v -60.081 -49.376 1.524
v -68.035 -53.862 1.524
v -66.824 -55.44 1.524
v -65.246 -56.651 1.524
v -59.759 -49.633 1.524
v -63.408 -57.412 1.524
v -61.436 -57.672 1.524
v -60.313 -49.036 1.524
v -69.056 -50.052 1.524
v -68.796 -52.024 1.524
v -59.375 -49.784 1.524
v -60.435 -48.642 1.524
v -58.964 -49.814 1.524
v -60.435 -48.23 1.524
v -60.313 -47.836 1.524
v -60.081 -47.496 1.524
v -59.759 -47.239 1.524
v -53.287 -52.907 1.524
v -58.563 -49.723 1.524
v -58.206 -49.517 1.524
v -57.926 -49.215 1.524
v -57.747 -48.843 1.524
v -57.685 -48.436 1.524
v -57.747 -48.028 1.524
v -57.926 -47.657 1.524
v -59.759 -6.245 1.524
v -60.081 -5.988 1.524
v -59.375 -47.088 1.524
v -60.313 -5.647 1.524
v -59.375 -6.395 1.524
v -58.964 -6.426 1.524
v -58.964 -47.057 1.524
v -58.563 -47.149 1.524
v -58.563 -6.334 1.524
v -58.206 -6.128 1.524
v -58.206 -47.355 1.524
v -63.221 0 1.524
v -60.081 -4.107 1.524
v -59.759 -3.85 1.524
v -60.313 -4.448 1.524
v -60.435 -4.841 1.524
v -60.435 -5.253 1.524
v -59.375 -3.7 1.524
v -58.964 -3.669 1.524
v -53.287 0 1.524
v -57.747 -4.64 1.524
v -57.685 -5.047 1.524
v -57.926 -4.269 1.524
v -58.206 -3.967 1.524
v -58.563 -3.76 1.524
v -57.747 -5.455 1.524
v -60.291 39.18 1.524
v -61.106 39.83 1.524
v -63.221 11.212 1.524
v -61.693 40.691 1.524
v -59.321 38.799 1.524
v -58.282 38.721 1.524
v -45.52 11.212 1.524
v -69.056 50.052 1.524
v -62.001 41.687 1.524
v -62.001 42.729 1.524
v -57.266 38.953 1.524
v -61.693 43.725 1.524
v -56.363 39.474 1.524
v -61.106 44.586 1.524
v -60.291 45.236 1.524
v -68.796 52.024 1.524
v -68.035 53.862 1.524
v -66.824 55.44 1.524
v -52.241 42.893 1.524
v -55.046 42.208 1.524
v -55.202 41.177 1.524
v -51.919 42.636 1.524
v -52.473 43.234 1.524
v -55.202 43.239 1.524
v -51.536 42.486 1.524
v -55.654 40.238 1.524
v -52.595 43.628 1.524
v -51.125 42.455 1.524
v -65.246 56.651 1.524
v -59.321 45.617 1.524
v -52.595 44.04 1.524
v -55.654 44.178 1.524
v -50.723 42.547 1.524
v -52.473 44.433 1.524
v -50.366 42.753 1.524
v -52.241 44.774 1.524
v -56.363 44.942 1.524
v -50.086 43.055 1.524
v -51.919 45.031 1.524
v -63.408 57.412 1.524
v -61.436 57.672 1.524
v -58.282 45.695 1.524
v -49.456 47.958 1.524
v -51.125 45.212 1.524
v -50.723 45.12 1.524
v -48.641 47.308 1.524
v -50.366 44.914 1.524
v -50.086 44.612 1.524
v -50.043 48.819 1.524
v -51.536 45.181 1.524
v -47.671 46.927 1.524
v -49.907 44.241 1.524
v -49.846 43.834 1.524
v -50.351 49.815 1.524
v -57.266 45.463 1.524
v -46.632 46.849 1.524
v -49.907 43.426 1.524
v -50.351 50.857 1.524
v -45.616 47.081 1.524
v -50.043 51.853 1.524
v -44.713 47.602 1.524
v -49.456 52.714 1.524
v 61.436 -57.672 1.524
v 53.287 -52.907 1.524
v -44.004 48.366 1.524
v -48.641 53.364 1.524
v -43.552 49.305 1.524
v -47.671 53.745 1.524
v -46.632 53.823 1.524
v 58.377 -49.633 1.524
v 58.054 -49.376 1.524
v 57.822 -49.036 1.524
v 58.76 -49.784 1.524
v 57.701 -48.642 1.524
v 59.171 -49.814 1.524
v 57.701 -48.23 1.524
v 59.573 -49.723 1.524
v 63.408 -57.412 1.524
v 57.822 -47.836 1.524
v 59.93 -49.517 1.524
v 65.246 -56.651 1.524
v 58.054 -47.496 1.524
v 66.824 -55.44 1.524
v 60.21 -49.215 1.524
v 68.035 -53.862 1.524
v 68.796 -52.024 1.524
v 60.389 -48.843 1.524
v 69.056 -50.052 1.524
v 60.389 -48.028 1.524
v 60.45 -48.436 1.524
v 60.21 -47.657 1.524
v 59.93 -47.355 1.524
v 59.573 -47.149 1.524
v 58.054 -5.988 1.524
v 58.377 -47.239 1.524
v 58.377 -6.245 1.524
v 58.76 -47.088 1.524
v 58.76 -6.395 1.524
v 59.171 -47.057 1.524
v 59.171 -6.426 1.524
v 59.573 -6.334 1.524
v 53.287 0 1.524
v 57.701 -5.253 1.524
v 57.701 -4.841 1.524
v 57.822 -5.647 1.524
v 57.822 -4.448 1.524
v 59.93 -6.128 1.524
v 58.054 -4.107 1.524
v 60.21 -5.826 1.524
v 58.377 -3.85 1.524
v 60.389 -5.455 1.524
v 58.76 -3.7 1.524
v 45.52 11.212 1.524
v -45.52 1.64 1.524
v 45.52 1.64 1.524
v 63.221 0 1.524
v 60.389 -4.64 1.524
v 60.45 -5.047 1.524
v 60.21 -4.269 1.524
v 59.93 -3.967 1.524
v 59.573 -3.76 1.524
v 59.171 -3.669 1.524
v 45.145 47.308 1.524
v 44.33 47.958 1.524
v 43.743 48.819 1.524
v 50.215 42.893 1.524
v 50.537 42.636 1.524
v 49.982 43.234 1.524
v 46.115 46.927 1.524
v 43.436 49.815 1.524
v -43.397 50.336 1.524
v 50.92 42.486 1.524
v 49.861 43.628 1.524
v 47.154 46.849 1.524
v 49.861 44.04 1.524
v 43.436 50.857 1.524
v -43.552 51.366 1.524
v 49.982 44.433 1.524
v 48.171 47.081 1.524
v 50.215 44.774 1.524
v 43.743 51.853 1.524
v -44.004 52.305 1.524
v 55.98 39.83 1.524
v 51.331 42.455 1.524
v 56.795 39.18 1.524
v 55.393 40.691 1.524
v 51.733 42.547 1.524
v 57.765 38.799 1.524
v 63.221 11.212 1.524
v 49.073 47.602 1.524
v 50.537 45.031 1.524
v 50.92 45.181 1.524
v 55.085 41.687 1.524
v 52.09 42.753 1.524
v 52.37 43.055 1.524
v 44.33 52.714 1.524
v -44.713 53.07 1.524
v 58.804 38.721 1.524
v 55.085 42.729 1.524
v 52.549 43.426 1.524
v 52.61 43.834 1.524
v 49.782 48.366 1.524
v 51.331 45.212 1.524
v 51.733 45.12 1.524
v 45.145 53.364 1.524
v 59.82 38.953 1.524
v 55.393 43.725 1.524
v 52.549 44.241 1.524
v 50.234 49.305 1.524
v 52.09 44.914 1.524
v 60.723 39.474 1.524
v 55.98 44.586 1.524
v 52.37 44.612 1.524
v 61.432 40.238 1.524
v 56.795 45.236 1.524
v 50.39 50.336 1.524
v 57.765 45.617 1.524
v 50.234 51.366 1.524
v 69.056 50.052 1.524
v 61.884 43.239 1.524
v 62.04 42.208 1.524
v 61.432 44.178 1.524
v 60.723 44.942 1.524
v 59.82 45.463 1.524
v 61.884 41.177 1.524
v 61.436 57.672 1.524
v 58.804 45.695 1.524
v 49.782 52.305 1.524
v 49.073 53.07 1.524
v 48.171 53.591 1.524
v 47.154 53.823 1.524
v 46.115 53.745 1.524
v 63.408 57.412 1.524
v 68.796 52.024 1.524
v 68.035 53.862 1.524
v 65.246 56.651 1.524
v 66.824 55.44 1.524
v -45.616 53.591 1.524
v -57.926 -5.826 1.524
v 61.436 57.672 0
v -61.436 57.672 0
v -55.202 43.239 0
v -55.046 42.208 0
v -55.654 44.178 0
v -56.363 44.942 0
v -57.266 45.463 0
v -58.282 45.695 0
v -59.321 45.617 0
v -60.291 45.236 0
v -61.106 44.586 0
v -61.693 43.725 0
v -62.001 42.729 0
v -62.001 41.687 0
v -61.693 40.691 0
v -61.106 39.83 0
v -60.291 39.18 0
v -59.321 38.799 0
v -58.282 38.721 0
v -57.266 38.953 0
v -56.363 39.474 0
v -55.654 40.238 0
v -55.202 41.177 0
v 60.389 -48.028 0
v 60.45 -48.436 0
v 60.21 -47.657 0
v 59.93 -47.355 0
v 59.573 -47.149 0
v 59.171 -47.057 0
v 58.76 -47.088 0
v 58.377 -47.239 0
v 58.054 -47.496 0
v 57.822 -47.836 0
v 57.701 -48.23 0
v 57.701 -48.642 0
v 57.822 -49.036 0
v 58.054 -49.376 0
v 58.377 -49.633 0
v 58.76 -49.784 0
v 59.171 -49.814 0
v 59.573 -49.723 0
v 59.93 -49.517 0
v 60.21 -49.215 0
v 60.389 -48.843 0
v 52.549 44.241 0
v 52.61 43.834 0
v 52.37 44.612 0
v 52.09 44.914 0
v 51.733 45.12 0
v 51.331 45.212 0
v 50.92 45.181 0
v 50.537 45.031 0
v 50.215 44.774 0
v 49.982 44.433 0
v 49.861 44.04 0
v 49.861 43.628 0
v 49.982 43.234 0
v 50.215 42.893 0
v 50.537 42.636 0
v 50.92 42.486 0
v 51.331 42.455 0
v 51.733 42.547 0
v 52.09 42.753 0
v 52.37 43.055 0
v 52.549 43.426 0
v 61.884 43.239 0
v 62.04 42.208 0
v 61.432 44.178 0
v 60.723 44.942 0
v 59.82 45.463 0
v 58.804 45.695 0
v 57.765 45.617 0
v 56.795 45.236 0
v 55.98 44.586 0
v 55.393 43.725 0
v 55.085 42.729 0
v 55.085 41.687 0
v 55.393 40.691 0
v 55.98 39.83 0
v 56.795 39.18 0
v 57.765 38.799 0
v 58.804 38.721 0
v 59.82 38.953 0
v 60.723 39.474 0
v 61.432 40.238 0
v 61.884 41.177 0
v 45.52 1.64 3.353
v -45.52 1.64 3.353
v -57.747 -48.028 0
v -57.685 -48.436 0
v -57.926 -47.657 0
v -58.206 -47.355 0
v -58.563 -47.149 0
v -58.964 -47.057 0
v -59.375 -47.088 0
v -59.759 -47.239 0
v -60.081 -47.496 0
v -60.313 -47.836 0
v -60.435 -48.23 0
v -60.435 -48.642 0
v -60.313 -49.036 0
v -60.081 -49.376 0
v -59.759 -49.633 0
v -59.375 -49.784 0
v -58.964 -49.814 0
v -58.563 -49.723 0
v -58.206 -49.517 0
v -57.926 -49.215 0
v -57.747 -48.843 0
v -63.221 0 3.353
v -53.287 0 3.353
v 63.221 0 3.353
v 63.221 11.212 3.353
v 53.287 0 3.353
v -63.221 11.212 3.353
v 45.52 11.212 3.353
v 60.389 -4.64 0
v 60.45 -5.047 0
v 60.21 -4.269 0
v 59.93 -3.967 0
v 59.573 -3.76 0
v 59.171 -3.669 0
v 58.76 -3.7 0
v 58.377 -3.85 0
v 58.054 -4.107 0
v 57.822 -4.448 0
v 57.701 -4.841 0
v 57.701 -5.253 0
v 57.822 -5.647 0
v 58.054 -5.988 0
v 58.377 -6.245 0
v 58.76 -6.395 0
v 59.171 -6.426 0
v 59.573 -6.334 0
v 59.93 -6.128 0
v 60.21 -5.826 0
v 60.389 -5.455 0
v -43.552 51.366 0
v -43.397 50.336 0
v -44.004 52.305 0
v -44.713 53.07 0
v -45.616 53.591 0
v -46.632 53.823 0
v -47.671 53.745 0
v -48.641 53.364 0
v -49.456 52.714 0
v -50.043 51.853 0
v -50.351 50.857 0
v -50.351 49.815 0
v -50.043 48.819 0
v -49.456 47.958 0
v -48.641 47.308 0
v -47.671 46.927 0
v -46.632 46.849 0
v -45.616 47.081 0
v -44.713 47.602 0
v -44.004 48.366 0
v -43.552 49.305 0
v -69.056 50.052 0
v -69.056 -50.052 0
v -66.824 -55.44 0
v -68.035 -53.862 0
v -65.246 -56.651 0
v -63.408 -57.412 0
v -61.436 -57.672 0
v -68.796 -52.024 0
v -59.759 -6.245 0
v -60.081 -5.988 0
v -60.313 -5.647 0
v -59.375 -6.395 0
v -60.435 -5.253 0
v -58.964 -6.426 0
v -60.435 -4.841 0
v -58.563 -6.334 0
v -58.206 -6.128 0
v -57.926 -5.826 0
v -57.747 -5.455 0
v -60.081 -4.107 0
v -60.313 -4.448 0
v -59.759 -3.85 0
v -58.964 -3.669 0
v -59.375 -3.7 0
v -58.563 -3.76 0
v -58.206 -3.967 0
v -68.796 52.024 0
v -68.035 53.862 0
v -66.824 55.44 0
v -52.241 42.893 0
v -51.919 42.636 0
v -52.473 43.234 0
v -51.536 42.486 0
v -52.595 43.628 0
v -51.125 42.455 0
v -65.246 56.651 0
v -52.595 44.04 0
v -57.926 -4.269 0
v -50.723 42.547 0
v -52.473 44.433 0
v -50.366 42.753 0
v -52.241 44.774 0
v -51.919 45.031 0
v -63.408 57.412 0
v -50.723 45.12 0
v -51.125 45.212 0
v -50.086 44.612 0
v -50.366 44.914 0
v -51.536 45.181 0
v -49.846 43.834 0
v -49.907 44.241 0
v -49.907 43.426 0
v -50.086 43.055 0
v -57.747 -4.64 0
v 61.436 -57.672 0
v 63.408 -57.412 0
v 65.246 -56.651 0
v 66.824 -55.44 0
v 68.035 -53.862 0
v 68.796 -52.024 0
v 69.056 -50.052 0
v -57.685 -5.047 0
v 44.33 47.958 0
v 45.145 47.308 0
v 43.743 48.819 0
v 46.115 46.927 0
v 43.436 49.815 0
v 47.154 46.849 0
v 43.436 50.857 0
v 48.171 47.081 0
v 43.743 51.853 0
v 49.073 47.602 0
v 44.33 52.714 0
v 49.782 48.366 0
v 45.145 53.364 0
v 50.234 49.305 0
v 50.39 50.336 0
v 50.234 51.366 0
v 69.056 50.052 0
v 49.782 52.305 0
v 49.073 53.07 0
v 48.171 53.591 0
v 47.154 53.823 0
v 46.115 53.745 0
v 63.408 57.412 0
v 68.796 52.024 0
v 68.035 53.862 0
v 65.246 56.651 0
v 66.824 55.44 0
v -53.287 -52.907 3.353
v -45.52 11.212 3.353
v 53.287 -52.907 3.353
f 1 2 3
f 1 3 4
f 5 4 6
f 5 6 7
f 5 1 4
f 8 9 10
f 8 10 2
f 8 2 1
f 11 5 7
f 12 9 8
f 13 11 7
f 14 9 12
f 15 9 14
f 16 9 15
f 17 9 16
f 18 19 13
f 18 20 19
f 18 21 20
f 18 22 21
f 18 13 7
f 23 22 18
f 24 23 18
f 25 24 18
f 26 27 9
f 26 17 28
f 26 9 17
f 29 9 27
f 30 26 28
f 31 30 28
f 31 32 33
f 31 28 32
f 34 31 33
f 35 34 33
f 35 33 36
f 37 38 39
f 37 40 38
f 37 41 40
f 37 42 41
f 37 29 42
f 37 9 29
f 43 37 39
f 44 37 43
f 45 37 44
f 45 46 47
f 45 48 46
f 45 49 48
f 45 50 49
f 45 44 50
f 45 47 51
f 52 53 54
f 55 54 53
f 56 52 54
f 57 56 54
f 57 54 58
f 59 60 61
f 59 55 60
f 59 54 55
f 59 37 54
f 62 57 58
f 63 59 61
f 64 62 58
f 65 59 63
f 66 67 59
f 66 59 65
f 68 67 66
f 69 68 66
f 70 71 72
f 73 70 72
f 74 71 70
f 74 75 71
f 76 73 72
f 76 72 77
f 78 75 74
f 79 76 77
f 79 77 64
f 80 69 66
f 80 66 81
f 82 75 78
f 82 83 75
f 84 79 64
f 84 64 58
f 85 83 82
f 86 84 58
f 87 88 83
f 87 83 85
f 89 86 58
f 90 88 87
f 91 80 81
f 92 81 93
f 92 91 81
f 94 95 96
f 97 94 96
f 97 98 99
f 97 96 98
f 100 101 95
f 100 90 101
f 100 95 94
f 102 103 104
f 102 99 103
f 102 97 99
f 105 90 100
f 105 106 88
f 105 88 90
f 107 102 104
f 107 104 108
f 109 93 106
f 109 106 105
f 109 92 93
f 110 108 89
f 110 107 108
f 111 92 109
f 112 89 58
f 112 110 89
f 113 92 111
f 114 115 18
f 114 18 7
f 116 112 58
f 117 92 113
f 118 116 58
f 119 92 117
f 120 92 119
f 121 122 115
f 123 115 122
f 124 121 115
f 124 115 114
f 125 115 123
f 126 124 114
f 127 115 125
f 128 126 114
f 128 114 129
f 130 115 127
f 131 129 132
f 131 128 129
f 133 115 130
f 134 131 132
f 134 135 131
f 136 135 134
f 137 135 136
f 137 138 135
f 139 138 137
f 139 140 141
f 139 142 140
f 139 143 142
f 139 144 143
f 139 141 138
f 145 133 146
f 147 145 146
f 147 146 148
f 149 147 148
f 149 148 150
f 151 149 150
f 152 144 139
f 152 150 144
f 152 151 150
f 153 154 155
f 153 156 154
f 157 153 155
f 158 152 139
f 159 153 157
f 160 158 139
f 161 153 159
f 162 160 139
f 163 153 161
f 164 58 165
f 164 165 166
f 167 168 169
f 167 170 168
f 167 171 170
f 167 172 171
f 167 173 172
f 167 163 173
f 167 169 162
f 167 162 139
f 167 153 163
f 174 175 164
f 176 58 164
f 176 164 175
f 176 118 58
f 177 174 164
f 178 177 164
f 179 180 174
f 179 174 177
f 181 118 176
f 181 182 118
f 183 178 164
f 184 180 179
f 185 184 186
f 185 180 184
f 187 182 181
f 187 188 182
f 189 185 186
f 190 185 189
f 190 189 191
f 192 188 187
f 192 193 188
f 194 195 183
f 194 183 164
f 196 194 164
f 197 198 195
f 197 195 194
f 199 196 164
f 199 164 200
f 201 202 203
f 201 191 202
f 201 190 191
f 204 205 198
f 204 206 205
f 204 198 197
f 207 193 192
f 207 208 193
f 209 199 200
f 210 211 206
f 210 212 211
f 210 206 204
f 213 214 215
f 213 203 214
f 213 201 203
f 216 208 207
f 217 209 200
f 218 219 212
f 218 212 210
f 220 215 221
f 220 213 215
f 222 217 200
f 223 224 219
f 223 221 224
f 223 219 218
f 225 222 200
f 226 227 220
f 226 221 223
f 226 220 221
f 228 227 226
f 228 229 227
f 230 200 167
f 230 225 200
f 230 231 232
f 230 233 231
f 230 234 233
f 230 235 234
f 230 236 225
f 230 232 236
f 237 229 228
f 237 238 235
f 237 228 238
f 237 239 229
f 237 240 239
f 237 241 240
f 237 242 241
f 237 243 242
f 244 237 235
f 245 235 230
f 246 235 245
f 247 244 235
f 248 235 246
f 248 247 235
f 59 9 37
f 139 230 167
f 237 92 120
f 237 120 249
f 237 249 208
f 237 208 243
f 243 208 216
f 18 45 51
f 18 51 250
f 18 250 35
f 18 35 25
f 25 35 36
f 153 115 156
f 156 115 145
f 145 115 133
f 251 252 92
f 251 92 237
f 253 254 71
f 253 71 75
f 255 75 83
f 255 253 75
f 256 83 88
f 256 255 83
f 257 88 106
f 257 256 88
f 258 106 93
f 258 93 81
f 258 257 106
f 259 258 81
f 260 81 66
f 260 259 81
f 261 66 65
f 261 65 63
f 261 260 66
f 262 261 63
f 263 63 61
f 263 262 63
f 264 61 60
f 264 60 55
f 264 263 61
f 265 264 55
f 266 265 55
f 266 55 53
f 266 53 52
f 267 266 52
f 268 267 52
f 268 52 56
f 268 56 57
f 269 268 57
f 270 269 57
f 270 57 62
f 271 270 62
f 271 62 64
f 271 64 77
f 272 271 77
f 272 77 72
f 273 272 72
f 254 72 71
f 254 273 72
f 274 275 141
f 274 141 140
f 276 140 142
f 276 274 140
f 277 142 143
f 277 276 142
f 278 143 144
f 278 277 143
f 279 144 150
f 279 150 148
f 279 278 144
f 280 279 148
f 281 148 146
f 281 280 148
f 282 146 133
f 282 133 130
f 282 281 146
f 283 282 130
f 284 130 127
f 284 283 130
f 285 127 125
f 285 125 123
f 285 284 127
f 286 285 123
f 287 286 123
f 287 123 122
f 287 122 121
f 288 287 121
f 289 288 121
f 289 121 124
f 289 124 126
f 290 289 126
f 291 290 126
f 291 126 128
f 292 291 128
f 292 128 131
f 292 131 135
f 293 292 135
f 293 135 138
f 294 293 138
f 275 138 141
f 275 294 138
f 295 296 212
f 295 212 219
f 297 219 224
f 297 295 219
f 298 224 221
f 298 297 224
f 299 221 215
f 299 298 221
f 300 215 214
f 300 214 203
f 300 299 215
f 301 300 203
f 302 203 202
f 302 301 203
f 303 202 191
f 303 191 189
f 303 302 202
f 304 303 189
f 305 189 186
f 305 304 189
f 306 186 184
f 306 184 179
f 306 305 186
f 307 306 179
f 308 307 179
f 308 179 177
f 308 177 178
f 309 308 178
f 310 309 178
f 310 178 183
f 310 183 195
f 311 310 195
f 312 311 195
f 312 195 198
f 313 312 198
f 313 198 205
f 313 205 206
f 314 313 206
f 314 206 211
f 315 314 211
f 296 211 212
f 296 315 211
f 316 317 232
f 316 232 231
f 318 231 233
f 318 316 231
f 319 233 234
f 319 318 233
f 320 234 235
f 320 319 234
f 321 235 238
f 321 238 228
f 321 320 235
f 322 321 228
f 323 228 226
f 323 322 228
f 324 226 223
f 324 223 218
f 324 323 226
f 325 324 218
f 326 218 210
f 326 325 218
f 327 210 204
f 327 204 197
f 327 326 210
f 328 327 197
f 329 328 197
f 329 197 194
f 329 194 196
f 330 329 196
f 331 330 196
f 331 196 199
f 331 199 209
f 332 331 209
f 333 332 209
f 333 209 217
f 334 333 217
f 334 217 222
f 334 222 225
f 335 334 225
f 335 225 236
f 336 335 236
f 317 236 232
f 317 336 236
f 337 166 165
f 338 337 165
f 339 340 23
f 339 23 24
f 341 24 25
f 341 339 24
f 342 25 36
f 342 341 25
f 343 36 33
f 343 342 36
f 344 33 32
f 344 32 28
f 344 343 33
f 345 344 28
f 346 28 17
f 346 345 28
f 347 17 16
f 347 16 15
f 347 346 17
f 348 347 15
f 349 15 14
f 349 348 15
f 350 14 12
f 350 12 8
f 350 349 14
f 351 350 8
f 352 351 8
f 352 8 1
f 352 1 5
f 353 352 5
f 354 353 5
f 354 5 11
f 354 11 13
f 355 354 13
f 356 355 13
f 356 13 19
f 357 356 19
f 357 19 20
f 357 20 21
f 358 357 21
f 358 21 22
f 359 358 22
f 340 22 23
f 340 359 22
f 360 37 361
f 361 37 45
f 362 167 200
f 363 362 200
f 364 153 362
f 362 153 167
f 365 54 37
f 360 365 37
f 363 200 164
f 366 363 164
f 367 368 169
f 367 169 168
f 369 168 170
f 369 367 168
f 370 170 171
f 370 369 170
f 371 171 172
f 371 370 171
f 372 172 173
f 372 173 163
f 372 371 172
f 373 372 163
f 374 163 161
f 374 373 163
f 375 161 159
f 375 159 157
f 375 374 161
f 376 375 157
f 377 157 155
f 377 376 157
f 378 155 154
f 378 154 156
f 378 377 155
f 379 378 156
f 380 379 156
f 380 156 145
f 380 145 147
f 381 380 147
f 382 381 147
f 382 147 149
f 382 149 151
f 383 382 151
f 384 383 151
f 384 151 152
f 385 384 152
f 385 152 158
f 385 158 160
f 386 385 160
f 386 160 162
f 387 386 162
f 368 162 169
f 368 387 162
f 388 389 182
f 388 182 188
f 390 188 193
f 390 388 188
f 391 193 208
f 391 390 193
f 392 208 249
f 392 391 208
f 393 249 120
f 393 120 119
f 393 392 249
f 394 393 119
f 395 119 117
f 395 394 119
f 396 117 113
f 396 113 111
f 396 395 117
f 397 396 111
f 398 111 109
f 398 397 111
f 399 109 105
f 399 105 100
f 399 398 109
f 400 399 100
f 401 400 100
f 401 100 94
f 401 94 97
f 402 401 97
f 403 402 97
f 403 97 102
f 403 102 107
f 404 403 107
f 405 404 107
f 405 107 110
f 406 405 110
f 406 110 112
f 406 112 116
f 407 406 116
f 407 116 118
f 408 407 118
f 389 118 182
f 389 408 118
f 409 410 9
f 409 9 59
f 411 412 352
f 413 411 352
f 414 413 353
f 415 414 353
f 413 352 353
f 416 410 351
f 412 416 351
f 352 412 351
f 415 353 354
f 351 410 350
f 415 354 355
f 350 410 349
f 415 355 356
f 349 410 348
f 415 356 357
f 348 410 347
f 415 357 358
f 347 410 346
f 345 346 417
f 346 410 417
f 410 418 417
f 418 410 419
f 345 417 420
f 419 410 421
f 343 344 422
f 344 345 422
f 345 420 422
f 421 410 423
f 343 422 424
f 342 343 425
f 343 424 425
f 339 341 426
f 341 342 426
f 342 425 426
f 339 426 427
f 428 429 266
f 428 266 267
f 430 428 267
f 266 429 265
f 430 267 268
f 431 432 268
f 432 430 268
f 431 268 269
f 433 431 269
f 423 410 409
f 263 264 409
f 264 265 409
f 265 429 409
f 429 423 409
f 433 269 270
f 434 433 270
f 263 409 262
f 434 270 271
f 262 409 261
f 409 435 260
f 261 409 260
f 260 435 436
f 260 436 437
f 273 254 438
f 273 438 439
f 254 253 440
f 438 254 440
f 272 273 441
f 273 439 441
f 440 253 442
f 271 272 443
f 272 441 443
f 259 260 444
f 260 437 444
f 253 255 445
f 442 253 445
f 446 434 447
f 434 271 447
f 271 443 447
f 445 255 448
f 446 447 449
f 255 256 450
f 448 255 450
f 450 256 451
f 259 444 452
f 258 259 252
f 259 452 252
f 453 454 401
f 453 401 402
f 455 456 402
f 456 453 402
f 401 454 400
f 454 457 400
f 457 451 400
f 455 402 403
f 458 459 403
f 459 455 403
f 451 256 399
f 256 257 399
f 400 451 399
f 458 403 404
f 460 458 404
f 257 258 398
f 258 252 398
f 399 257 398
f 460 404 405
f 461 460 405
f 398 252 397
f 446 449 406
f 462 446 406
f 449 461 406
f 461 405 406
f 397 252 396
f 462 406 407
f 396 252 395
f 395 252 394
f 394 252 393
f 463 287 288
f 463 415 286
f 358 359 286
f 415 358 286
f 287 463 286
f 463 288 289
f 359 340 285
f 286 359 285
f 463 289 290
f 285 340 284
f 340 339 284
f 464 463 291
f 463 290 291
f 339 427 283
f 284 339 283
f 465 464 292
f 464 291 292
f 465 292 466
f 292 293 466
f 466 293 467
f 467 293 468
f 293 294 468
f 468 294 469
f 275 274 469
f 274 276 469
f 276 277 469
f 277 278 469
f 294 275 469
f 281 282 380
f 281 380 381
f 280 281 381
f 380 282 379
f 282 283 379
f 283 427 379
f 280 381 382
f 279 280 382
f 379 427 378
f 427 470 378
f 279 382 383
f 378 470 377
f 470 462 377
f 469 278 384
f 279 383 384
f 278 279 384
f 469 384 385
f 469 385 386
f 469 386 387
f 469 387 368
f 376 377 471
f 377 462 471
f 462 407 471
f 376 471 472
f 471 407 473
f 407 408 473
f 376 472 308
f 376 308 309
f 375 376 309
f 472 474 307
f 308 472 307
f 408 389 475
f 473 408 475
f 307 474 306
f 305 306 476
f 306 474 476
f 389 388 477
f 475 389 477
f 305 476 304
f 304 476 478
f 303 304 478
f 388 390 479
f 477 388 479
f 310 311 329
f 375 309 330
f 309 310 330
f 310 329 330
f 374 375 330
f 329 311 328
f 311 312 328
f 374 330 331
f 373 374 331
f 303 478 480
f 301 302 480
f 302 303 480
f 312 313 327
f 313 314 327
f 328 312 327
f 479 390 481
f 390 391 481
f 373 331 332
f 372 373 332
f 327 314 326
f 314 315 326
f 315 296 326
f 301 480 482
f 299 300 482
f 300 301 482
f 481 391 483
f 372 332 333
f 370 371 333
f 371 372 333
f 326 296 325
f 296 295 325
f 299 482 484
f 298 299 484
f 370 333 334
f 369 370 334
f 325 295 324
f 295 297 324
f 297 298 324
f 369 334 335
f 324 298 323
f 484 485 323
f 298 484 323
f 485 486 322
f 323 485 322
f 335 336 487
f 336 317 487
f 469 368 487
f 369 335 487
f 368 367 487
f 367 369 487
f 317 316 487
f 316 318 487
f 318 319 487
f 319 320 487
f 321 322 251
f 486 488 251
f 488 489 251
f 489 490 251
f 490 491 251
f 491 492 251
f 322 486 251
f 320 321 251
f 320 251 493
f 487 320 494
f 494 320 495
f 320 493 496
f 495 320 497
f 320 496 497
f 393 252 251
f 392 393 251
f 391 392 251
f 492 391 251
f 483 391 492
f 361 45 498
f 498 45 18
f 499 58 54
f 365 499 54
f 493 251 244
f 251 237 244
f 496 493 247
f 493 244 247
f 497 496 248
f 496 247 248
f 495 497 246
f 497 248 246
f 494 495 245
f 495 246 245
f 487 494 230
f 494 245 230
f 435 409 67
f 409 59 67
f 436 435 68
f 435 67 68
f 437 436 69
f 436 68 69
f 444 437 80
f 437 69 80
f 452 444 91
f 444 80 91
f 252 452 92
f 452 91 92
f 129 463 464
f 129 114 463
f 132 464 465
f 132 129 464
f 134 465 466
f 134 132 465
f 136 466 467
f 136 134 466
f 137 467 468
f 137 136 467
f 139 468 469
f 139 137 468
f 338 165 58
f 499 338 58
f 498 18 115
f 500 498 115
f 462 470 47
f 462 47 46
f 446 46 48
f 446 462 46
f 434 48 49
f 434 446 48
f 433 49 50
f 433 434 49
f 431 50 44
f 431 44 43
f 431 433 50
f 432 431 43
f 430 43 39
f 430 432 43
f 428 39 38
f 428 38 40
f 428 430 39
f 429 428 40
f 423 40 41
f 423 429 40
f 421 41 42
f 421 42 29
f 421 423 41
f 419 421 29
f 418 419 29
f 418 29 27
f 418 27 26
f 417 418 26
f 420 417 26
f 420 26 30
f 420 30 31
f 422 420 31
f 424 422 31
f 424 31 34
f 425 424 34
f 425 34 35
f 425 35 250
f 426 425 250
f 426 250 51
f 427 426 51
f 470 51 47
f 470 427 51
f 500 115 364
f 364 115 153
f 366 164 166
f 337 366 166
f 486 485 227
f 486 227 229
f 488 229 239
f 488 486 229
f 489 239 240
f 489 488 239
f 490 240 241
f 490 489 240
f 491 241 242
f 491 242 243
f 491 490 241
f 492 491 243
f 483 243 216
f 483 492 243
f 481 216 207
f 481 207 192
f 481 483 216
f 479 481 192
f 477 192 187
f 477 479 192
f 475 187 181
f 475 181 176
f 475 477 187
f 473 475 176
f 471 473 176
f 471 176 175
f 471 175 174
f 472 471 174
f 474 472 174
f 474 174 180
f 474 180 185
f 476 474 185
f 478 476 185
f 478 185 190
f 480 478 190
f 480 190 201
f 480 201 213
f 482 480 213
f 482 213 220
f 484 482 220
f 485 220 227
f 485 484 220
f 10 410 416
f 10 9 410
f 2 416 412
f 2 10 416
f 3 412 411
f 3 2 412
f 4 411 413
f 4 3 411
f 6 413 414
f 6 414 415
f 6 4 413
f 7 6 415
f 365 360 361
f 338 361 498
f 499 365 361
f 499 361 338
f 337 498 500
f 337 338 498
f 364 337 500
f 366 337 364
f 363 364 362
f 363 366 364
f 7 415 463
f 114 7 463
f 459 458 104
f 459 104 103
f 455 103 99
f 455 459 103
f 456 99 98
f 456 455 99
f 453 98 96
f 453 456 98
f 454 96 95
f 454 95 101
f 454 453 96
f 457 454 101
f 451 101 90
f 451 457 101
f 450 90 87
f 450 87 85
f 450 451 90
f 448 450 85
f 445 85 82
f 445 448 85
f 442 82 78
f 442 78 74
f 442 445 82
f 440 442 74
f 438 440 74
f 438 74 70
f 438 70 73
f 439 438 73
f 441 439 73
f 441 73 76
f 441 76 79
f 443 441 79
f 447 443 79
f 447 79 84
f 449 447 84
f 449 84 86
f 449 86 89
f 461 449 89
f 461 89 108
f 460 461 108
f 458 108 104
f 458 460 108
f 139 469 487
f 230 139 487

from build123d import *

# Parameters (mm, degrees)
F0_W     = 138.111218
F0_H     = 115.343272
F0_R     = 1.382409
F0_R_2   = 3.496557
F1_DEPTH = 1.524
F3_DEPTH = 1.8288
F4_R     = 7.62


with BuildPart() as f1:
    # F0 (on Top) → F1 (new body)
    with BuildSketch(Plane.XY):
        Rectangle(F0_W, F0_H)
        with Locations((-59.067786, -48.435853)):
            Circle(F0_R, mode=Mode.SUBTRACT)
        with Locations((-59.067786, -5.047345)):
            Circle(F0_R, mode=Mode.SUBTRACT)
        with Locations((59.067786, -48.435853)):
            Circle(F0_R, mode=Mode.SUBTRACT)
        with Locations((59.067786, -5.047345)):
            Circle(F0_R, mode=Mode.SUBTRACT)
        with Locations((-58.543, 42.207982)):
            Circle(F0_R_2, mode=Mode.SUBTRACT)
        with Locations((-51.227979, 43.833543)):
            Circle(F0_R, mode=Mode.SUBTRACT)
        with Locations((-46.893153, 50.335784)):
            Circle(F0_R_2, mode=Mode.SUBTRACT)
        with Locations((58.543, 42.207982)):
            Circle(F0_R_2, mode=Mode.SUBTRACT)
        with Locations((51.227979, 43.833543)):
            Circle(F0_R, mode=Mode.SUBTRACT)
        with Locations((46.893153, 50.335784)):
            Circle(F0_R_2, mode=Mode.SUBTRACT)
    extrude(amount=F1_DEPTH)

    # F2 (on face) → F3 (join)
    with BuildSketch(Plane.XY.offset(1.524)):
        Polygon((-53.286642, -52.906867), (0, -52.906867), (53.286642, -52.906867), (53.286642, 0), (63.22062, 0), (63.22062, 11.212443), (45.520075, 11.212443), (45.520075, 1.639701), (0, 1.639701), (-45.520075, 1.639701), (-45.520075, 11.212443), (-63.22062, 11.212443), (-63.22062, 0), (-53.286642, 0), align=None)
    extrude(amount=F3_DEPTH)

    # F4
    f4_edges = [f1.edges().sort_by_distance(p)[0] for p in [
        (-69.055609, 57.671636, 0.762),
        (69.055609, 57.671636, 0.762),
        (69.055609, -57.671636, 0.762),
        (-69.055609, -57.671636, 0.762),
    ]]
    fillet(f4_edges, radius=F4_R)


solid = f1.part
